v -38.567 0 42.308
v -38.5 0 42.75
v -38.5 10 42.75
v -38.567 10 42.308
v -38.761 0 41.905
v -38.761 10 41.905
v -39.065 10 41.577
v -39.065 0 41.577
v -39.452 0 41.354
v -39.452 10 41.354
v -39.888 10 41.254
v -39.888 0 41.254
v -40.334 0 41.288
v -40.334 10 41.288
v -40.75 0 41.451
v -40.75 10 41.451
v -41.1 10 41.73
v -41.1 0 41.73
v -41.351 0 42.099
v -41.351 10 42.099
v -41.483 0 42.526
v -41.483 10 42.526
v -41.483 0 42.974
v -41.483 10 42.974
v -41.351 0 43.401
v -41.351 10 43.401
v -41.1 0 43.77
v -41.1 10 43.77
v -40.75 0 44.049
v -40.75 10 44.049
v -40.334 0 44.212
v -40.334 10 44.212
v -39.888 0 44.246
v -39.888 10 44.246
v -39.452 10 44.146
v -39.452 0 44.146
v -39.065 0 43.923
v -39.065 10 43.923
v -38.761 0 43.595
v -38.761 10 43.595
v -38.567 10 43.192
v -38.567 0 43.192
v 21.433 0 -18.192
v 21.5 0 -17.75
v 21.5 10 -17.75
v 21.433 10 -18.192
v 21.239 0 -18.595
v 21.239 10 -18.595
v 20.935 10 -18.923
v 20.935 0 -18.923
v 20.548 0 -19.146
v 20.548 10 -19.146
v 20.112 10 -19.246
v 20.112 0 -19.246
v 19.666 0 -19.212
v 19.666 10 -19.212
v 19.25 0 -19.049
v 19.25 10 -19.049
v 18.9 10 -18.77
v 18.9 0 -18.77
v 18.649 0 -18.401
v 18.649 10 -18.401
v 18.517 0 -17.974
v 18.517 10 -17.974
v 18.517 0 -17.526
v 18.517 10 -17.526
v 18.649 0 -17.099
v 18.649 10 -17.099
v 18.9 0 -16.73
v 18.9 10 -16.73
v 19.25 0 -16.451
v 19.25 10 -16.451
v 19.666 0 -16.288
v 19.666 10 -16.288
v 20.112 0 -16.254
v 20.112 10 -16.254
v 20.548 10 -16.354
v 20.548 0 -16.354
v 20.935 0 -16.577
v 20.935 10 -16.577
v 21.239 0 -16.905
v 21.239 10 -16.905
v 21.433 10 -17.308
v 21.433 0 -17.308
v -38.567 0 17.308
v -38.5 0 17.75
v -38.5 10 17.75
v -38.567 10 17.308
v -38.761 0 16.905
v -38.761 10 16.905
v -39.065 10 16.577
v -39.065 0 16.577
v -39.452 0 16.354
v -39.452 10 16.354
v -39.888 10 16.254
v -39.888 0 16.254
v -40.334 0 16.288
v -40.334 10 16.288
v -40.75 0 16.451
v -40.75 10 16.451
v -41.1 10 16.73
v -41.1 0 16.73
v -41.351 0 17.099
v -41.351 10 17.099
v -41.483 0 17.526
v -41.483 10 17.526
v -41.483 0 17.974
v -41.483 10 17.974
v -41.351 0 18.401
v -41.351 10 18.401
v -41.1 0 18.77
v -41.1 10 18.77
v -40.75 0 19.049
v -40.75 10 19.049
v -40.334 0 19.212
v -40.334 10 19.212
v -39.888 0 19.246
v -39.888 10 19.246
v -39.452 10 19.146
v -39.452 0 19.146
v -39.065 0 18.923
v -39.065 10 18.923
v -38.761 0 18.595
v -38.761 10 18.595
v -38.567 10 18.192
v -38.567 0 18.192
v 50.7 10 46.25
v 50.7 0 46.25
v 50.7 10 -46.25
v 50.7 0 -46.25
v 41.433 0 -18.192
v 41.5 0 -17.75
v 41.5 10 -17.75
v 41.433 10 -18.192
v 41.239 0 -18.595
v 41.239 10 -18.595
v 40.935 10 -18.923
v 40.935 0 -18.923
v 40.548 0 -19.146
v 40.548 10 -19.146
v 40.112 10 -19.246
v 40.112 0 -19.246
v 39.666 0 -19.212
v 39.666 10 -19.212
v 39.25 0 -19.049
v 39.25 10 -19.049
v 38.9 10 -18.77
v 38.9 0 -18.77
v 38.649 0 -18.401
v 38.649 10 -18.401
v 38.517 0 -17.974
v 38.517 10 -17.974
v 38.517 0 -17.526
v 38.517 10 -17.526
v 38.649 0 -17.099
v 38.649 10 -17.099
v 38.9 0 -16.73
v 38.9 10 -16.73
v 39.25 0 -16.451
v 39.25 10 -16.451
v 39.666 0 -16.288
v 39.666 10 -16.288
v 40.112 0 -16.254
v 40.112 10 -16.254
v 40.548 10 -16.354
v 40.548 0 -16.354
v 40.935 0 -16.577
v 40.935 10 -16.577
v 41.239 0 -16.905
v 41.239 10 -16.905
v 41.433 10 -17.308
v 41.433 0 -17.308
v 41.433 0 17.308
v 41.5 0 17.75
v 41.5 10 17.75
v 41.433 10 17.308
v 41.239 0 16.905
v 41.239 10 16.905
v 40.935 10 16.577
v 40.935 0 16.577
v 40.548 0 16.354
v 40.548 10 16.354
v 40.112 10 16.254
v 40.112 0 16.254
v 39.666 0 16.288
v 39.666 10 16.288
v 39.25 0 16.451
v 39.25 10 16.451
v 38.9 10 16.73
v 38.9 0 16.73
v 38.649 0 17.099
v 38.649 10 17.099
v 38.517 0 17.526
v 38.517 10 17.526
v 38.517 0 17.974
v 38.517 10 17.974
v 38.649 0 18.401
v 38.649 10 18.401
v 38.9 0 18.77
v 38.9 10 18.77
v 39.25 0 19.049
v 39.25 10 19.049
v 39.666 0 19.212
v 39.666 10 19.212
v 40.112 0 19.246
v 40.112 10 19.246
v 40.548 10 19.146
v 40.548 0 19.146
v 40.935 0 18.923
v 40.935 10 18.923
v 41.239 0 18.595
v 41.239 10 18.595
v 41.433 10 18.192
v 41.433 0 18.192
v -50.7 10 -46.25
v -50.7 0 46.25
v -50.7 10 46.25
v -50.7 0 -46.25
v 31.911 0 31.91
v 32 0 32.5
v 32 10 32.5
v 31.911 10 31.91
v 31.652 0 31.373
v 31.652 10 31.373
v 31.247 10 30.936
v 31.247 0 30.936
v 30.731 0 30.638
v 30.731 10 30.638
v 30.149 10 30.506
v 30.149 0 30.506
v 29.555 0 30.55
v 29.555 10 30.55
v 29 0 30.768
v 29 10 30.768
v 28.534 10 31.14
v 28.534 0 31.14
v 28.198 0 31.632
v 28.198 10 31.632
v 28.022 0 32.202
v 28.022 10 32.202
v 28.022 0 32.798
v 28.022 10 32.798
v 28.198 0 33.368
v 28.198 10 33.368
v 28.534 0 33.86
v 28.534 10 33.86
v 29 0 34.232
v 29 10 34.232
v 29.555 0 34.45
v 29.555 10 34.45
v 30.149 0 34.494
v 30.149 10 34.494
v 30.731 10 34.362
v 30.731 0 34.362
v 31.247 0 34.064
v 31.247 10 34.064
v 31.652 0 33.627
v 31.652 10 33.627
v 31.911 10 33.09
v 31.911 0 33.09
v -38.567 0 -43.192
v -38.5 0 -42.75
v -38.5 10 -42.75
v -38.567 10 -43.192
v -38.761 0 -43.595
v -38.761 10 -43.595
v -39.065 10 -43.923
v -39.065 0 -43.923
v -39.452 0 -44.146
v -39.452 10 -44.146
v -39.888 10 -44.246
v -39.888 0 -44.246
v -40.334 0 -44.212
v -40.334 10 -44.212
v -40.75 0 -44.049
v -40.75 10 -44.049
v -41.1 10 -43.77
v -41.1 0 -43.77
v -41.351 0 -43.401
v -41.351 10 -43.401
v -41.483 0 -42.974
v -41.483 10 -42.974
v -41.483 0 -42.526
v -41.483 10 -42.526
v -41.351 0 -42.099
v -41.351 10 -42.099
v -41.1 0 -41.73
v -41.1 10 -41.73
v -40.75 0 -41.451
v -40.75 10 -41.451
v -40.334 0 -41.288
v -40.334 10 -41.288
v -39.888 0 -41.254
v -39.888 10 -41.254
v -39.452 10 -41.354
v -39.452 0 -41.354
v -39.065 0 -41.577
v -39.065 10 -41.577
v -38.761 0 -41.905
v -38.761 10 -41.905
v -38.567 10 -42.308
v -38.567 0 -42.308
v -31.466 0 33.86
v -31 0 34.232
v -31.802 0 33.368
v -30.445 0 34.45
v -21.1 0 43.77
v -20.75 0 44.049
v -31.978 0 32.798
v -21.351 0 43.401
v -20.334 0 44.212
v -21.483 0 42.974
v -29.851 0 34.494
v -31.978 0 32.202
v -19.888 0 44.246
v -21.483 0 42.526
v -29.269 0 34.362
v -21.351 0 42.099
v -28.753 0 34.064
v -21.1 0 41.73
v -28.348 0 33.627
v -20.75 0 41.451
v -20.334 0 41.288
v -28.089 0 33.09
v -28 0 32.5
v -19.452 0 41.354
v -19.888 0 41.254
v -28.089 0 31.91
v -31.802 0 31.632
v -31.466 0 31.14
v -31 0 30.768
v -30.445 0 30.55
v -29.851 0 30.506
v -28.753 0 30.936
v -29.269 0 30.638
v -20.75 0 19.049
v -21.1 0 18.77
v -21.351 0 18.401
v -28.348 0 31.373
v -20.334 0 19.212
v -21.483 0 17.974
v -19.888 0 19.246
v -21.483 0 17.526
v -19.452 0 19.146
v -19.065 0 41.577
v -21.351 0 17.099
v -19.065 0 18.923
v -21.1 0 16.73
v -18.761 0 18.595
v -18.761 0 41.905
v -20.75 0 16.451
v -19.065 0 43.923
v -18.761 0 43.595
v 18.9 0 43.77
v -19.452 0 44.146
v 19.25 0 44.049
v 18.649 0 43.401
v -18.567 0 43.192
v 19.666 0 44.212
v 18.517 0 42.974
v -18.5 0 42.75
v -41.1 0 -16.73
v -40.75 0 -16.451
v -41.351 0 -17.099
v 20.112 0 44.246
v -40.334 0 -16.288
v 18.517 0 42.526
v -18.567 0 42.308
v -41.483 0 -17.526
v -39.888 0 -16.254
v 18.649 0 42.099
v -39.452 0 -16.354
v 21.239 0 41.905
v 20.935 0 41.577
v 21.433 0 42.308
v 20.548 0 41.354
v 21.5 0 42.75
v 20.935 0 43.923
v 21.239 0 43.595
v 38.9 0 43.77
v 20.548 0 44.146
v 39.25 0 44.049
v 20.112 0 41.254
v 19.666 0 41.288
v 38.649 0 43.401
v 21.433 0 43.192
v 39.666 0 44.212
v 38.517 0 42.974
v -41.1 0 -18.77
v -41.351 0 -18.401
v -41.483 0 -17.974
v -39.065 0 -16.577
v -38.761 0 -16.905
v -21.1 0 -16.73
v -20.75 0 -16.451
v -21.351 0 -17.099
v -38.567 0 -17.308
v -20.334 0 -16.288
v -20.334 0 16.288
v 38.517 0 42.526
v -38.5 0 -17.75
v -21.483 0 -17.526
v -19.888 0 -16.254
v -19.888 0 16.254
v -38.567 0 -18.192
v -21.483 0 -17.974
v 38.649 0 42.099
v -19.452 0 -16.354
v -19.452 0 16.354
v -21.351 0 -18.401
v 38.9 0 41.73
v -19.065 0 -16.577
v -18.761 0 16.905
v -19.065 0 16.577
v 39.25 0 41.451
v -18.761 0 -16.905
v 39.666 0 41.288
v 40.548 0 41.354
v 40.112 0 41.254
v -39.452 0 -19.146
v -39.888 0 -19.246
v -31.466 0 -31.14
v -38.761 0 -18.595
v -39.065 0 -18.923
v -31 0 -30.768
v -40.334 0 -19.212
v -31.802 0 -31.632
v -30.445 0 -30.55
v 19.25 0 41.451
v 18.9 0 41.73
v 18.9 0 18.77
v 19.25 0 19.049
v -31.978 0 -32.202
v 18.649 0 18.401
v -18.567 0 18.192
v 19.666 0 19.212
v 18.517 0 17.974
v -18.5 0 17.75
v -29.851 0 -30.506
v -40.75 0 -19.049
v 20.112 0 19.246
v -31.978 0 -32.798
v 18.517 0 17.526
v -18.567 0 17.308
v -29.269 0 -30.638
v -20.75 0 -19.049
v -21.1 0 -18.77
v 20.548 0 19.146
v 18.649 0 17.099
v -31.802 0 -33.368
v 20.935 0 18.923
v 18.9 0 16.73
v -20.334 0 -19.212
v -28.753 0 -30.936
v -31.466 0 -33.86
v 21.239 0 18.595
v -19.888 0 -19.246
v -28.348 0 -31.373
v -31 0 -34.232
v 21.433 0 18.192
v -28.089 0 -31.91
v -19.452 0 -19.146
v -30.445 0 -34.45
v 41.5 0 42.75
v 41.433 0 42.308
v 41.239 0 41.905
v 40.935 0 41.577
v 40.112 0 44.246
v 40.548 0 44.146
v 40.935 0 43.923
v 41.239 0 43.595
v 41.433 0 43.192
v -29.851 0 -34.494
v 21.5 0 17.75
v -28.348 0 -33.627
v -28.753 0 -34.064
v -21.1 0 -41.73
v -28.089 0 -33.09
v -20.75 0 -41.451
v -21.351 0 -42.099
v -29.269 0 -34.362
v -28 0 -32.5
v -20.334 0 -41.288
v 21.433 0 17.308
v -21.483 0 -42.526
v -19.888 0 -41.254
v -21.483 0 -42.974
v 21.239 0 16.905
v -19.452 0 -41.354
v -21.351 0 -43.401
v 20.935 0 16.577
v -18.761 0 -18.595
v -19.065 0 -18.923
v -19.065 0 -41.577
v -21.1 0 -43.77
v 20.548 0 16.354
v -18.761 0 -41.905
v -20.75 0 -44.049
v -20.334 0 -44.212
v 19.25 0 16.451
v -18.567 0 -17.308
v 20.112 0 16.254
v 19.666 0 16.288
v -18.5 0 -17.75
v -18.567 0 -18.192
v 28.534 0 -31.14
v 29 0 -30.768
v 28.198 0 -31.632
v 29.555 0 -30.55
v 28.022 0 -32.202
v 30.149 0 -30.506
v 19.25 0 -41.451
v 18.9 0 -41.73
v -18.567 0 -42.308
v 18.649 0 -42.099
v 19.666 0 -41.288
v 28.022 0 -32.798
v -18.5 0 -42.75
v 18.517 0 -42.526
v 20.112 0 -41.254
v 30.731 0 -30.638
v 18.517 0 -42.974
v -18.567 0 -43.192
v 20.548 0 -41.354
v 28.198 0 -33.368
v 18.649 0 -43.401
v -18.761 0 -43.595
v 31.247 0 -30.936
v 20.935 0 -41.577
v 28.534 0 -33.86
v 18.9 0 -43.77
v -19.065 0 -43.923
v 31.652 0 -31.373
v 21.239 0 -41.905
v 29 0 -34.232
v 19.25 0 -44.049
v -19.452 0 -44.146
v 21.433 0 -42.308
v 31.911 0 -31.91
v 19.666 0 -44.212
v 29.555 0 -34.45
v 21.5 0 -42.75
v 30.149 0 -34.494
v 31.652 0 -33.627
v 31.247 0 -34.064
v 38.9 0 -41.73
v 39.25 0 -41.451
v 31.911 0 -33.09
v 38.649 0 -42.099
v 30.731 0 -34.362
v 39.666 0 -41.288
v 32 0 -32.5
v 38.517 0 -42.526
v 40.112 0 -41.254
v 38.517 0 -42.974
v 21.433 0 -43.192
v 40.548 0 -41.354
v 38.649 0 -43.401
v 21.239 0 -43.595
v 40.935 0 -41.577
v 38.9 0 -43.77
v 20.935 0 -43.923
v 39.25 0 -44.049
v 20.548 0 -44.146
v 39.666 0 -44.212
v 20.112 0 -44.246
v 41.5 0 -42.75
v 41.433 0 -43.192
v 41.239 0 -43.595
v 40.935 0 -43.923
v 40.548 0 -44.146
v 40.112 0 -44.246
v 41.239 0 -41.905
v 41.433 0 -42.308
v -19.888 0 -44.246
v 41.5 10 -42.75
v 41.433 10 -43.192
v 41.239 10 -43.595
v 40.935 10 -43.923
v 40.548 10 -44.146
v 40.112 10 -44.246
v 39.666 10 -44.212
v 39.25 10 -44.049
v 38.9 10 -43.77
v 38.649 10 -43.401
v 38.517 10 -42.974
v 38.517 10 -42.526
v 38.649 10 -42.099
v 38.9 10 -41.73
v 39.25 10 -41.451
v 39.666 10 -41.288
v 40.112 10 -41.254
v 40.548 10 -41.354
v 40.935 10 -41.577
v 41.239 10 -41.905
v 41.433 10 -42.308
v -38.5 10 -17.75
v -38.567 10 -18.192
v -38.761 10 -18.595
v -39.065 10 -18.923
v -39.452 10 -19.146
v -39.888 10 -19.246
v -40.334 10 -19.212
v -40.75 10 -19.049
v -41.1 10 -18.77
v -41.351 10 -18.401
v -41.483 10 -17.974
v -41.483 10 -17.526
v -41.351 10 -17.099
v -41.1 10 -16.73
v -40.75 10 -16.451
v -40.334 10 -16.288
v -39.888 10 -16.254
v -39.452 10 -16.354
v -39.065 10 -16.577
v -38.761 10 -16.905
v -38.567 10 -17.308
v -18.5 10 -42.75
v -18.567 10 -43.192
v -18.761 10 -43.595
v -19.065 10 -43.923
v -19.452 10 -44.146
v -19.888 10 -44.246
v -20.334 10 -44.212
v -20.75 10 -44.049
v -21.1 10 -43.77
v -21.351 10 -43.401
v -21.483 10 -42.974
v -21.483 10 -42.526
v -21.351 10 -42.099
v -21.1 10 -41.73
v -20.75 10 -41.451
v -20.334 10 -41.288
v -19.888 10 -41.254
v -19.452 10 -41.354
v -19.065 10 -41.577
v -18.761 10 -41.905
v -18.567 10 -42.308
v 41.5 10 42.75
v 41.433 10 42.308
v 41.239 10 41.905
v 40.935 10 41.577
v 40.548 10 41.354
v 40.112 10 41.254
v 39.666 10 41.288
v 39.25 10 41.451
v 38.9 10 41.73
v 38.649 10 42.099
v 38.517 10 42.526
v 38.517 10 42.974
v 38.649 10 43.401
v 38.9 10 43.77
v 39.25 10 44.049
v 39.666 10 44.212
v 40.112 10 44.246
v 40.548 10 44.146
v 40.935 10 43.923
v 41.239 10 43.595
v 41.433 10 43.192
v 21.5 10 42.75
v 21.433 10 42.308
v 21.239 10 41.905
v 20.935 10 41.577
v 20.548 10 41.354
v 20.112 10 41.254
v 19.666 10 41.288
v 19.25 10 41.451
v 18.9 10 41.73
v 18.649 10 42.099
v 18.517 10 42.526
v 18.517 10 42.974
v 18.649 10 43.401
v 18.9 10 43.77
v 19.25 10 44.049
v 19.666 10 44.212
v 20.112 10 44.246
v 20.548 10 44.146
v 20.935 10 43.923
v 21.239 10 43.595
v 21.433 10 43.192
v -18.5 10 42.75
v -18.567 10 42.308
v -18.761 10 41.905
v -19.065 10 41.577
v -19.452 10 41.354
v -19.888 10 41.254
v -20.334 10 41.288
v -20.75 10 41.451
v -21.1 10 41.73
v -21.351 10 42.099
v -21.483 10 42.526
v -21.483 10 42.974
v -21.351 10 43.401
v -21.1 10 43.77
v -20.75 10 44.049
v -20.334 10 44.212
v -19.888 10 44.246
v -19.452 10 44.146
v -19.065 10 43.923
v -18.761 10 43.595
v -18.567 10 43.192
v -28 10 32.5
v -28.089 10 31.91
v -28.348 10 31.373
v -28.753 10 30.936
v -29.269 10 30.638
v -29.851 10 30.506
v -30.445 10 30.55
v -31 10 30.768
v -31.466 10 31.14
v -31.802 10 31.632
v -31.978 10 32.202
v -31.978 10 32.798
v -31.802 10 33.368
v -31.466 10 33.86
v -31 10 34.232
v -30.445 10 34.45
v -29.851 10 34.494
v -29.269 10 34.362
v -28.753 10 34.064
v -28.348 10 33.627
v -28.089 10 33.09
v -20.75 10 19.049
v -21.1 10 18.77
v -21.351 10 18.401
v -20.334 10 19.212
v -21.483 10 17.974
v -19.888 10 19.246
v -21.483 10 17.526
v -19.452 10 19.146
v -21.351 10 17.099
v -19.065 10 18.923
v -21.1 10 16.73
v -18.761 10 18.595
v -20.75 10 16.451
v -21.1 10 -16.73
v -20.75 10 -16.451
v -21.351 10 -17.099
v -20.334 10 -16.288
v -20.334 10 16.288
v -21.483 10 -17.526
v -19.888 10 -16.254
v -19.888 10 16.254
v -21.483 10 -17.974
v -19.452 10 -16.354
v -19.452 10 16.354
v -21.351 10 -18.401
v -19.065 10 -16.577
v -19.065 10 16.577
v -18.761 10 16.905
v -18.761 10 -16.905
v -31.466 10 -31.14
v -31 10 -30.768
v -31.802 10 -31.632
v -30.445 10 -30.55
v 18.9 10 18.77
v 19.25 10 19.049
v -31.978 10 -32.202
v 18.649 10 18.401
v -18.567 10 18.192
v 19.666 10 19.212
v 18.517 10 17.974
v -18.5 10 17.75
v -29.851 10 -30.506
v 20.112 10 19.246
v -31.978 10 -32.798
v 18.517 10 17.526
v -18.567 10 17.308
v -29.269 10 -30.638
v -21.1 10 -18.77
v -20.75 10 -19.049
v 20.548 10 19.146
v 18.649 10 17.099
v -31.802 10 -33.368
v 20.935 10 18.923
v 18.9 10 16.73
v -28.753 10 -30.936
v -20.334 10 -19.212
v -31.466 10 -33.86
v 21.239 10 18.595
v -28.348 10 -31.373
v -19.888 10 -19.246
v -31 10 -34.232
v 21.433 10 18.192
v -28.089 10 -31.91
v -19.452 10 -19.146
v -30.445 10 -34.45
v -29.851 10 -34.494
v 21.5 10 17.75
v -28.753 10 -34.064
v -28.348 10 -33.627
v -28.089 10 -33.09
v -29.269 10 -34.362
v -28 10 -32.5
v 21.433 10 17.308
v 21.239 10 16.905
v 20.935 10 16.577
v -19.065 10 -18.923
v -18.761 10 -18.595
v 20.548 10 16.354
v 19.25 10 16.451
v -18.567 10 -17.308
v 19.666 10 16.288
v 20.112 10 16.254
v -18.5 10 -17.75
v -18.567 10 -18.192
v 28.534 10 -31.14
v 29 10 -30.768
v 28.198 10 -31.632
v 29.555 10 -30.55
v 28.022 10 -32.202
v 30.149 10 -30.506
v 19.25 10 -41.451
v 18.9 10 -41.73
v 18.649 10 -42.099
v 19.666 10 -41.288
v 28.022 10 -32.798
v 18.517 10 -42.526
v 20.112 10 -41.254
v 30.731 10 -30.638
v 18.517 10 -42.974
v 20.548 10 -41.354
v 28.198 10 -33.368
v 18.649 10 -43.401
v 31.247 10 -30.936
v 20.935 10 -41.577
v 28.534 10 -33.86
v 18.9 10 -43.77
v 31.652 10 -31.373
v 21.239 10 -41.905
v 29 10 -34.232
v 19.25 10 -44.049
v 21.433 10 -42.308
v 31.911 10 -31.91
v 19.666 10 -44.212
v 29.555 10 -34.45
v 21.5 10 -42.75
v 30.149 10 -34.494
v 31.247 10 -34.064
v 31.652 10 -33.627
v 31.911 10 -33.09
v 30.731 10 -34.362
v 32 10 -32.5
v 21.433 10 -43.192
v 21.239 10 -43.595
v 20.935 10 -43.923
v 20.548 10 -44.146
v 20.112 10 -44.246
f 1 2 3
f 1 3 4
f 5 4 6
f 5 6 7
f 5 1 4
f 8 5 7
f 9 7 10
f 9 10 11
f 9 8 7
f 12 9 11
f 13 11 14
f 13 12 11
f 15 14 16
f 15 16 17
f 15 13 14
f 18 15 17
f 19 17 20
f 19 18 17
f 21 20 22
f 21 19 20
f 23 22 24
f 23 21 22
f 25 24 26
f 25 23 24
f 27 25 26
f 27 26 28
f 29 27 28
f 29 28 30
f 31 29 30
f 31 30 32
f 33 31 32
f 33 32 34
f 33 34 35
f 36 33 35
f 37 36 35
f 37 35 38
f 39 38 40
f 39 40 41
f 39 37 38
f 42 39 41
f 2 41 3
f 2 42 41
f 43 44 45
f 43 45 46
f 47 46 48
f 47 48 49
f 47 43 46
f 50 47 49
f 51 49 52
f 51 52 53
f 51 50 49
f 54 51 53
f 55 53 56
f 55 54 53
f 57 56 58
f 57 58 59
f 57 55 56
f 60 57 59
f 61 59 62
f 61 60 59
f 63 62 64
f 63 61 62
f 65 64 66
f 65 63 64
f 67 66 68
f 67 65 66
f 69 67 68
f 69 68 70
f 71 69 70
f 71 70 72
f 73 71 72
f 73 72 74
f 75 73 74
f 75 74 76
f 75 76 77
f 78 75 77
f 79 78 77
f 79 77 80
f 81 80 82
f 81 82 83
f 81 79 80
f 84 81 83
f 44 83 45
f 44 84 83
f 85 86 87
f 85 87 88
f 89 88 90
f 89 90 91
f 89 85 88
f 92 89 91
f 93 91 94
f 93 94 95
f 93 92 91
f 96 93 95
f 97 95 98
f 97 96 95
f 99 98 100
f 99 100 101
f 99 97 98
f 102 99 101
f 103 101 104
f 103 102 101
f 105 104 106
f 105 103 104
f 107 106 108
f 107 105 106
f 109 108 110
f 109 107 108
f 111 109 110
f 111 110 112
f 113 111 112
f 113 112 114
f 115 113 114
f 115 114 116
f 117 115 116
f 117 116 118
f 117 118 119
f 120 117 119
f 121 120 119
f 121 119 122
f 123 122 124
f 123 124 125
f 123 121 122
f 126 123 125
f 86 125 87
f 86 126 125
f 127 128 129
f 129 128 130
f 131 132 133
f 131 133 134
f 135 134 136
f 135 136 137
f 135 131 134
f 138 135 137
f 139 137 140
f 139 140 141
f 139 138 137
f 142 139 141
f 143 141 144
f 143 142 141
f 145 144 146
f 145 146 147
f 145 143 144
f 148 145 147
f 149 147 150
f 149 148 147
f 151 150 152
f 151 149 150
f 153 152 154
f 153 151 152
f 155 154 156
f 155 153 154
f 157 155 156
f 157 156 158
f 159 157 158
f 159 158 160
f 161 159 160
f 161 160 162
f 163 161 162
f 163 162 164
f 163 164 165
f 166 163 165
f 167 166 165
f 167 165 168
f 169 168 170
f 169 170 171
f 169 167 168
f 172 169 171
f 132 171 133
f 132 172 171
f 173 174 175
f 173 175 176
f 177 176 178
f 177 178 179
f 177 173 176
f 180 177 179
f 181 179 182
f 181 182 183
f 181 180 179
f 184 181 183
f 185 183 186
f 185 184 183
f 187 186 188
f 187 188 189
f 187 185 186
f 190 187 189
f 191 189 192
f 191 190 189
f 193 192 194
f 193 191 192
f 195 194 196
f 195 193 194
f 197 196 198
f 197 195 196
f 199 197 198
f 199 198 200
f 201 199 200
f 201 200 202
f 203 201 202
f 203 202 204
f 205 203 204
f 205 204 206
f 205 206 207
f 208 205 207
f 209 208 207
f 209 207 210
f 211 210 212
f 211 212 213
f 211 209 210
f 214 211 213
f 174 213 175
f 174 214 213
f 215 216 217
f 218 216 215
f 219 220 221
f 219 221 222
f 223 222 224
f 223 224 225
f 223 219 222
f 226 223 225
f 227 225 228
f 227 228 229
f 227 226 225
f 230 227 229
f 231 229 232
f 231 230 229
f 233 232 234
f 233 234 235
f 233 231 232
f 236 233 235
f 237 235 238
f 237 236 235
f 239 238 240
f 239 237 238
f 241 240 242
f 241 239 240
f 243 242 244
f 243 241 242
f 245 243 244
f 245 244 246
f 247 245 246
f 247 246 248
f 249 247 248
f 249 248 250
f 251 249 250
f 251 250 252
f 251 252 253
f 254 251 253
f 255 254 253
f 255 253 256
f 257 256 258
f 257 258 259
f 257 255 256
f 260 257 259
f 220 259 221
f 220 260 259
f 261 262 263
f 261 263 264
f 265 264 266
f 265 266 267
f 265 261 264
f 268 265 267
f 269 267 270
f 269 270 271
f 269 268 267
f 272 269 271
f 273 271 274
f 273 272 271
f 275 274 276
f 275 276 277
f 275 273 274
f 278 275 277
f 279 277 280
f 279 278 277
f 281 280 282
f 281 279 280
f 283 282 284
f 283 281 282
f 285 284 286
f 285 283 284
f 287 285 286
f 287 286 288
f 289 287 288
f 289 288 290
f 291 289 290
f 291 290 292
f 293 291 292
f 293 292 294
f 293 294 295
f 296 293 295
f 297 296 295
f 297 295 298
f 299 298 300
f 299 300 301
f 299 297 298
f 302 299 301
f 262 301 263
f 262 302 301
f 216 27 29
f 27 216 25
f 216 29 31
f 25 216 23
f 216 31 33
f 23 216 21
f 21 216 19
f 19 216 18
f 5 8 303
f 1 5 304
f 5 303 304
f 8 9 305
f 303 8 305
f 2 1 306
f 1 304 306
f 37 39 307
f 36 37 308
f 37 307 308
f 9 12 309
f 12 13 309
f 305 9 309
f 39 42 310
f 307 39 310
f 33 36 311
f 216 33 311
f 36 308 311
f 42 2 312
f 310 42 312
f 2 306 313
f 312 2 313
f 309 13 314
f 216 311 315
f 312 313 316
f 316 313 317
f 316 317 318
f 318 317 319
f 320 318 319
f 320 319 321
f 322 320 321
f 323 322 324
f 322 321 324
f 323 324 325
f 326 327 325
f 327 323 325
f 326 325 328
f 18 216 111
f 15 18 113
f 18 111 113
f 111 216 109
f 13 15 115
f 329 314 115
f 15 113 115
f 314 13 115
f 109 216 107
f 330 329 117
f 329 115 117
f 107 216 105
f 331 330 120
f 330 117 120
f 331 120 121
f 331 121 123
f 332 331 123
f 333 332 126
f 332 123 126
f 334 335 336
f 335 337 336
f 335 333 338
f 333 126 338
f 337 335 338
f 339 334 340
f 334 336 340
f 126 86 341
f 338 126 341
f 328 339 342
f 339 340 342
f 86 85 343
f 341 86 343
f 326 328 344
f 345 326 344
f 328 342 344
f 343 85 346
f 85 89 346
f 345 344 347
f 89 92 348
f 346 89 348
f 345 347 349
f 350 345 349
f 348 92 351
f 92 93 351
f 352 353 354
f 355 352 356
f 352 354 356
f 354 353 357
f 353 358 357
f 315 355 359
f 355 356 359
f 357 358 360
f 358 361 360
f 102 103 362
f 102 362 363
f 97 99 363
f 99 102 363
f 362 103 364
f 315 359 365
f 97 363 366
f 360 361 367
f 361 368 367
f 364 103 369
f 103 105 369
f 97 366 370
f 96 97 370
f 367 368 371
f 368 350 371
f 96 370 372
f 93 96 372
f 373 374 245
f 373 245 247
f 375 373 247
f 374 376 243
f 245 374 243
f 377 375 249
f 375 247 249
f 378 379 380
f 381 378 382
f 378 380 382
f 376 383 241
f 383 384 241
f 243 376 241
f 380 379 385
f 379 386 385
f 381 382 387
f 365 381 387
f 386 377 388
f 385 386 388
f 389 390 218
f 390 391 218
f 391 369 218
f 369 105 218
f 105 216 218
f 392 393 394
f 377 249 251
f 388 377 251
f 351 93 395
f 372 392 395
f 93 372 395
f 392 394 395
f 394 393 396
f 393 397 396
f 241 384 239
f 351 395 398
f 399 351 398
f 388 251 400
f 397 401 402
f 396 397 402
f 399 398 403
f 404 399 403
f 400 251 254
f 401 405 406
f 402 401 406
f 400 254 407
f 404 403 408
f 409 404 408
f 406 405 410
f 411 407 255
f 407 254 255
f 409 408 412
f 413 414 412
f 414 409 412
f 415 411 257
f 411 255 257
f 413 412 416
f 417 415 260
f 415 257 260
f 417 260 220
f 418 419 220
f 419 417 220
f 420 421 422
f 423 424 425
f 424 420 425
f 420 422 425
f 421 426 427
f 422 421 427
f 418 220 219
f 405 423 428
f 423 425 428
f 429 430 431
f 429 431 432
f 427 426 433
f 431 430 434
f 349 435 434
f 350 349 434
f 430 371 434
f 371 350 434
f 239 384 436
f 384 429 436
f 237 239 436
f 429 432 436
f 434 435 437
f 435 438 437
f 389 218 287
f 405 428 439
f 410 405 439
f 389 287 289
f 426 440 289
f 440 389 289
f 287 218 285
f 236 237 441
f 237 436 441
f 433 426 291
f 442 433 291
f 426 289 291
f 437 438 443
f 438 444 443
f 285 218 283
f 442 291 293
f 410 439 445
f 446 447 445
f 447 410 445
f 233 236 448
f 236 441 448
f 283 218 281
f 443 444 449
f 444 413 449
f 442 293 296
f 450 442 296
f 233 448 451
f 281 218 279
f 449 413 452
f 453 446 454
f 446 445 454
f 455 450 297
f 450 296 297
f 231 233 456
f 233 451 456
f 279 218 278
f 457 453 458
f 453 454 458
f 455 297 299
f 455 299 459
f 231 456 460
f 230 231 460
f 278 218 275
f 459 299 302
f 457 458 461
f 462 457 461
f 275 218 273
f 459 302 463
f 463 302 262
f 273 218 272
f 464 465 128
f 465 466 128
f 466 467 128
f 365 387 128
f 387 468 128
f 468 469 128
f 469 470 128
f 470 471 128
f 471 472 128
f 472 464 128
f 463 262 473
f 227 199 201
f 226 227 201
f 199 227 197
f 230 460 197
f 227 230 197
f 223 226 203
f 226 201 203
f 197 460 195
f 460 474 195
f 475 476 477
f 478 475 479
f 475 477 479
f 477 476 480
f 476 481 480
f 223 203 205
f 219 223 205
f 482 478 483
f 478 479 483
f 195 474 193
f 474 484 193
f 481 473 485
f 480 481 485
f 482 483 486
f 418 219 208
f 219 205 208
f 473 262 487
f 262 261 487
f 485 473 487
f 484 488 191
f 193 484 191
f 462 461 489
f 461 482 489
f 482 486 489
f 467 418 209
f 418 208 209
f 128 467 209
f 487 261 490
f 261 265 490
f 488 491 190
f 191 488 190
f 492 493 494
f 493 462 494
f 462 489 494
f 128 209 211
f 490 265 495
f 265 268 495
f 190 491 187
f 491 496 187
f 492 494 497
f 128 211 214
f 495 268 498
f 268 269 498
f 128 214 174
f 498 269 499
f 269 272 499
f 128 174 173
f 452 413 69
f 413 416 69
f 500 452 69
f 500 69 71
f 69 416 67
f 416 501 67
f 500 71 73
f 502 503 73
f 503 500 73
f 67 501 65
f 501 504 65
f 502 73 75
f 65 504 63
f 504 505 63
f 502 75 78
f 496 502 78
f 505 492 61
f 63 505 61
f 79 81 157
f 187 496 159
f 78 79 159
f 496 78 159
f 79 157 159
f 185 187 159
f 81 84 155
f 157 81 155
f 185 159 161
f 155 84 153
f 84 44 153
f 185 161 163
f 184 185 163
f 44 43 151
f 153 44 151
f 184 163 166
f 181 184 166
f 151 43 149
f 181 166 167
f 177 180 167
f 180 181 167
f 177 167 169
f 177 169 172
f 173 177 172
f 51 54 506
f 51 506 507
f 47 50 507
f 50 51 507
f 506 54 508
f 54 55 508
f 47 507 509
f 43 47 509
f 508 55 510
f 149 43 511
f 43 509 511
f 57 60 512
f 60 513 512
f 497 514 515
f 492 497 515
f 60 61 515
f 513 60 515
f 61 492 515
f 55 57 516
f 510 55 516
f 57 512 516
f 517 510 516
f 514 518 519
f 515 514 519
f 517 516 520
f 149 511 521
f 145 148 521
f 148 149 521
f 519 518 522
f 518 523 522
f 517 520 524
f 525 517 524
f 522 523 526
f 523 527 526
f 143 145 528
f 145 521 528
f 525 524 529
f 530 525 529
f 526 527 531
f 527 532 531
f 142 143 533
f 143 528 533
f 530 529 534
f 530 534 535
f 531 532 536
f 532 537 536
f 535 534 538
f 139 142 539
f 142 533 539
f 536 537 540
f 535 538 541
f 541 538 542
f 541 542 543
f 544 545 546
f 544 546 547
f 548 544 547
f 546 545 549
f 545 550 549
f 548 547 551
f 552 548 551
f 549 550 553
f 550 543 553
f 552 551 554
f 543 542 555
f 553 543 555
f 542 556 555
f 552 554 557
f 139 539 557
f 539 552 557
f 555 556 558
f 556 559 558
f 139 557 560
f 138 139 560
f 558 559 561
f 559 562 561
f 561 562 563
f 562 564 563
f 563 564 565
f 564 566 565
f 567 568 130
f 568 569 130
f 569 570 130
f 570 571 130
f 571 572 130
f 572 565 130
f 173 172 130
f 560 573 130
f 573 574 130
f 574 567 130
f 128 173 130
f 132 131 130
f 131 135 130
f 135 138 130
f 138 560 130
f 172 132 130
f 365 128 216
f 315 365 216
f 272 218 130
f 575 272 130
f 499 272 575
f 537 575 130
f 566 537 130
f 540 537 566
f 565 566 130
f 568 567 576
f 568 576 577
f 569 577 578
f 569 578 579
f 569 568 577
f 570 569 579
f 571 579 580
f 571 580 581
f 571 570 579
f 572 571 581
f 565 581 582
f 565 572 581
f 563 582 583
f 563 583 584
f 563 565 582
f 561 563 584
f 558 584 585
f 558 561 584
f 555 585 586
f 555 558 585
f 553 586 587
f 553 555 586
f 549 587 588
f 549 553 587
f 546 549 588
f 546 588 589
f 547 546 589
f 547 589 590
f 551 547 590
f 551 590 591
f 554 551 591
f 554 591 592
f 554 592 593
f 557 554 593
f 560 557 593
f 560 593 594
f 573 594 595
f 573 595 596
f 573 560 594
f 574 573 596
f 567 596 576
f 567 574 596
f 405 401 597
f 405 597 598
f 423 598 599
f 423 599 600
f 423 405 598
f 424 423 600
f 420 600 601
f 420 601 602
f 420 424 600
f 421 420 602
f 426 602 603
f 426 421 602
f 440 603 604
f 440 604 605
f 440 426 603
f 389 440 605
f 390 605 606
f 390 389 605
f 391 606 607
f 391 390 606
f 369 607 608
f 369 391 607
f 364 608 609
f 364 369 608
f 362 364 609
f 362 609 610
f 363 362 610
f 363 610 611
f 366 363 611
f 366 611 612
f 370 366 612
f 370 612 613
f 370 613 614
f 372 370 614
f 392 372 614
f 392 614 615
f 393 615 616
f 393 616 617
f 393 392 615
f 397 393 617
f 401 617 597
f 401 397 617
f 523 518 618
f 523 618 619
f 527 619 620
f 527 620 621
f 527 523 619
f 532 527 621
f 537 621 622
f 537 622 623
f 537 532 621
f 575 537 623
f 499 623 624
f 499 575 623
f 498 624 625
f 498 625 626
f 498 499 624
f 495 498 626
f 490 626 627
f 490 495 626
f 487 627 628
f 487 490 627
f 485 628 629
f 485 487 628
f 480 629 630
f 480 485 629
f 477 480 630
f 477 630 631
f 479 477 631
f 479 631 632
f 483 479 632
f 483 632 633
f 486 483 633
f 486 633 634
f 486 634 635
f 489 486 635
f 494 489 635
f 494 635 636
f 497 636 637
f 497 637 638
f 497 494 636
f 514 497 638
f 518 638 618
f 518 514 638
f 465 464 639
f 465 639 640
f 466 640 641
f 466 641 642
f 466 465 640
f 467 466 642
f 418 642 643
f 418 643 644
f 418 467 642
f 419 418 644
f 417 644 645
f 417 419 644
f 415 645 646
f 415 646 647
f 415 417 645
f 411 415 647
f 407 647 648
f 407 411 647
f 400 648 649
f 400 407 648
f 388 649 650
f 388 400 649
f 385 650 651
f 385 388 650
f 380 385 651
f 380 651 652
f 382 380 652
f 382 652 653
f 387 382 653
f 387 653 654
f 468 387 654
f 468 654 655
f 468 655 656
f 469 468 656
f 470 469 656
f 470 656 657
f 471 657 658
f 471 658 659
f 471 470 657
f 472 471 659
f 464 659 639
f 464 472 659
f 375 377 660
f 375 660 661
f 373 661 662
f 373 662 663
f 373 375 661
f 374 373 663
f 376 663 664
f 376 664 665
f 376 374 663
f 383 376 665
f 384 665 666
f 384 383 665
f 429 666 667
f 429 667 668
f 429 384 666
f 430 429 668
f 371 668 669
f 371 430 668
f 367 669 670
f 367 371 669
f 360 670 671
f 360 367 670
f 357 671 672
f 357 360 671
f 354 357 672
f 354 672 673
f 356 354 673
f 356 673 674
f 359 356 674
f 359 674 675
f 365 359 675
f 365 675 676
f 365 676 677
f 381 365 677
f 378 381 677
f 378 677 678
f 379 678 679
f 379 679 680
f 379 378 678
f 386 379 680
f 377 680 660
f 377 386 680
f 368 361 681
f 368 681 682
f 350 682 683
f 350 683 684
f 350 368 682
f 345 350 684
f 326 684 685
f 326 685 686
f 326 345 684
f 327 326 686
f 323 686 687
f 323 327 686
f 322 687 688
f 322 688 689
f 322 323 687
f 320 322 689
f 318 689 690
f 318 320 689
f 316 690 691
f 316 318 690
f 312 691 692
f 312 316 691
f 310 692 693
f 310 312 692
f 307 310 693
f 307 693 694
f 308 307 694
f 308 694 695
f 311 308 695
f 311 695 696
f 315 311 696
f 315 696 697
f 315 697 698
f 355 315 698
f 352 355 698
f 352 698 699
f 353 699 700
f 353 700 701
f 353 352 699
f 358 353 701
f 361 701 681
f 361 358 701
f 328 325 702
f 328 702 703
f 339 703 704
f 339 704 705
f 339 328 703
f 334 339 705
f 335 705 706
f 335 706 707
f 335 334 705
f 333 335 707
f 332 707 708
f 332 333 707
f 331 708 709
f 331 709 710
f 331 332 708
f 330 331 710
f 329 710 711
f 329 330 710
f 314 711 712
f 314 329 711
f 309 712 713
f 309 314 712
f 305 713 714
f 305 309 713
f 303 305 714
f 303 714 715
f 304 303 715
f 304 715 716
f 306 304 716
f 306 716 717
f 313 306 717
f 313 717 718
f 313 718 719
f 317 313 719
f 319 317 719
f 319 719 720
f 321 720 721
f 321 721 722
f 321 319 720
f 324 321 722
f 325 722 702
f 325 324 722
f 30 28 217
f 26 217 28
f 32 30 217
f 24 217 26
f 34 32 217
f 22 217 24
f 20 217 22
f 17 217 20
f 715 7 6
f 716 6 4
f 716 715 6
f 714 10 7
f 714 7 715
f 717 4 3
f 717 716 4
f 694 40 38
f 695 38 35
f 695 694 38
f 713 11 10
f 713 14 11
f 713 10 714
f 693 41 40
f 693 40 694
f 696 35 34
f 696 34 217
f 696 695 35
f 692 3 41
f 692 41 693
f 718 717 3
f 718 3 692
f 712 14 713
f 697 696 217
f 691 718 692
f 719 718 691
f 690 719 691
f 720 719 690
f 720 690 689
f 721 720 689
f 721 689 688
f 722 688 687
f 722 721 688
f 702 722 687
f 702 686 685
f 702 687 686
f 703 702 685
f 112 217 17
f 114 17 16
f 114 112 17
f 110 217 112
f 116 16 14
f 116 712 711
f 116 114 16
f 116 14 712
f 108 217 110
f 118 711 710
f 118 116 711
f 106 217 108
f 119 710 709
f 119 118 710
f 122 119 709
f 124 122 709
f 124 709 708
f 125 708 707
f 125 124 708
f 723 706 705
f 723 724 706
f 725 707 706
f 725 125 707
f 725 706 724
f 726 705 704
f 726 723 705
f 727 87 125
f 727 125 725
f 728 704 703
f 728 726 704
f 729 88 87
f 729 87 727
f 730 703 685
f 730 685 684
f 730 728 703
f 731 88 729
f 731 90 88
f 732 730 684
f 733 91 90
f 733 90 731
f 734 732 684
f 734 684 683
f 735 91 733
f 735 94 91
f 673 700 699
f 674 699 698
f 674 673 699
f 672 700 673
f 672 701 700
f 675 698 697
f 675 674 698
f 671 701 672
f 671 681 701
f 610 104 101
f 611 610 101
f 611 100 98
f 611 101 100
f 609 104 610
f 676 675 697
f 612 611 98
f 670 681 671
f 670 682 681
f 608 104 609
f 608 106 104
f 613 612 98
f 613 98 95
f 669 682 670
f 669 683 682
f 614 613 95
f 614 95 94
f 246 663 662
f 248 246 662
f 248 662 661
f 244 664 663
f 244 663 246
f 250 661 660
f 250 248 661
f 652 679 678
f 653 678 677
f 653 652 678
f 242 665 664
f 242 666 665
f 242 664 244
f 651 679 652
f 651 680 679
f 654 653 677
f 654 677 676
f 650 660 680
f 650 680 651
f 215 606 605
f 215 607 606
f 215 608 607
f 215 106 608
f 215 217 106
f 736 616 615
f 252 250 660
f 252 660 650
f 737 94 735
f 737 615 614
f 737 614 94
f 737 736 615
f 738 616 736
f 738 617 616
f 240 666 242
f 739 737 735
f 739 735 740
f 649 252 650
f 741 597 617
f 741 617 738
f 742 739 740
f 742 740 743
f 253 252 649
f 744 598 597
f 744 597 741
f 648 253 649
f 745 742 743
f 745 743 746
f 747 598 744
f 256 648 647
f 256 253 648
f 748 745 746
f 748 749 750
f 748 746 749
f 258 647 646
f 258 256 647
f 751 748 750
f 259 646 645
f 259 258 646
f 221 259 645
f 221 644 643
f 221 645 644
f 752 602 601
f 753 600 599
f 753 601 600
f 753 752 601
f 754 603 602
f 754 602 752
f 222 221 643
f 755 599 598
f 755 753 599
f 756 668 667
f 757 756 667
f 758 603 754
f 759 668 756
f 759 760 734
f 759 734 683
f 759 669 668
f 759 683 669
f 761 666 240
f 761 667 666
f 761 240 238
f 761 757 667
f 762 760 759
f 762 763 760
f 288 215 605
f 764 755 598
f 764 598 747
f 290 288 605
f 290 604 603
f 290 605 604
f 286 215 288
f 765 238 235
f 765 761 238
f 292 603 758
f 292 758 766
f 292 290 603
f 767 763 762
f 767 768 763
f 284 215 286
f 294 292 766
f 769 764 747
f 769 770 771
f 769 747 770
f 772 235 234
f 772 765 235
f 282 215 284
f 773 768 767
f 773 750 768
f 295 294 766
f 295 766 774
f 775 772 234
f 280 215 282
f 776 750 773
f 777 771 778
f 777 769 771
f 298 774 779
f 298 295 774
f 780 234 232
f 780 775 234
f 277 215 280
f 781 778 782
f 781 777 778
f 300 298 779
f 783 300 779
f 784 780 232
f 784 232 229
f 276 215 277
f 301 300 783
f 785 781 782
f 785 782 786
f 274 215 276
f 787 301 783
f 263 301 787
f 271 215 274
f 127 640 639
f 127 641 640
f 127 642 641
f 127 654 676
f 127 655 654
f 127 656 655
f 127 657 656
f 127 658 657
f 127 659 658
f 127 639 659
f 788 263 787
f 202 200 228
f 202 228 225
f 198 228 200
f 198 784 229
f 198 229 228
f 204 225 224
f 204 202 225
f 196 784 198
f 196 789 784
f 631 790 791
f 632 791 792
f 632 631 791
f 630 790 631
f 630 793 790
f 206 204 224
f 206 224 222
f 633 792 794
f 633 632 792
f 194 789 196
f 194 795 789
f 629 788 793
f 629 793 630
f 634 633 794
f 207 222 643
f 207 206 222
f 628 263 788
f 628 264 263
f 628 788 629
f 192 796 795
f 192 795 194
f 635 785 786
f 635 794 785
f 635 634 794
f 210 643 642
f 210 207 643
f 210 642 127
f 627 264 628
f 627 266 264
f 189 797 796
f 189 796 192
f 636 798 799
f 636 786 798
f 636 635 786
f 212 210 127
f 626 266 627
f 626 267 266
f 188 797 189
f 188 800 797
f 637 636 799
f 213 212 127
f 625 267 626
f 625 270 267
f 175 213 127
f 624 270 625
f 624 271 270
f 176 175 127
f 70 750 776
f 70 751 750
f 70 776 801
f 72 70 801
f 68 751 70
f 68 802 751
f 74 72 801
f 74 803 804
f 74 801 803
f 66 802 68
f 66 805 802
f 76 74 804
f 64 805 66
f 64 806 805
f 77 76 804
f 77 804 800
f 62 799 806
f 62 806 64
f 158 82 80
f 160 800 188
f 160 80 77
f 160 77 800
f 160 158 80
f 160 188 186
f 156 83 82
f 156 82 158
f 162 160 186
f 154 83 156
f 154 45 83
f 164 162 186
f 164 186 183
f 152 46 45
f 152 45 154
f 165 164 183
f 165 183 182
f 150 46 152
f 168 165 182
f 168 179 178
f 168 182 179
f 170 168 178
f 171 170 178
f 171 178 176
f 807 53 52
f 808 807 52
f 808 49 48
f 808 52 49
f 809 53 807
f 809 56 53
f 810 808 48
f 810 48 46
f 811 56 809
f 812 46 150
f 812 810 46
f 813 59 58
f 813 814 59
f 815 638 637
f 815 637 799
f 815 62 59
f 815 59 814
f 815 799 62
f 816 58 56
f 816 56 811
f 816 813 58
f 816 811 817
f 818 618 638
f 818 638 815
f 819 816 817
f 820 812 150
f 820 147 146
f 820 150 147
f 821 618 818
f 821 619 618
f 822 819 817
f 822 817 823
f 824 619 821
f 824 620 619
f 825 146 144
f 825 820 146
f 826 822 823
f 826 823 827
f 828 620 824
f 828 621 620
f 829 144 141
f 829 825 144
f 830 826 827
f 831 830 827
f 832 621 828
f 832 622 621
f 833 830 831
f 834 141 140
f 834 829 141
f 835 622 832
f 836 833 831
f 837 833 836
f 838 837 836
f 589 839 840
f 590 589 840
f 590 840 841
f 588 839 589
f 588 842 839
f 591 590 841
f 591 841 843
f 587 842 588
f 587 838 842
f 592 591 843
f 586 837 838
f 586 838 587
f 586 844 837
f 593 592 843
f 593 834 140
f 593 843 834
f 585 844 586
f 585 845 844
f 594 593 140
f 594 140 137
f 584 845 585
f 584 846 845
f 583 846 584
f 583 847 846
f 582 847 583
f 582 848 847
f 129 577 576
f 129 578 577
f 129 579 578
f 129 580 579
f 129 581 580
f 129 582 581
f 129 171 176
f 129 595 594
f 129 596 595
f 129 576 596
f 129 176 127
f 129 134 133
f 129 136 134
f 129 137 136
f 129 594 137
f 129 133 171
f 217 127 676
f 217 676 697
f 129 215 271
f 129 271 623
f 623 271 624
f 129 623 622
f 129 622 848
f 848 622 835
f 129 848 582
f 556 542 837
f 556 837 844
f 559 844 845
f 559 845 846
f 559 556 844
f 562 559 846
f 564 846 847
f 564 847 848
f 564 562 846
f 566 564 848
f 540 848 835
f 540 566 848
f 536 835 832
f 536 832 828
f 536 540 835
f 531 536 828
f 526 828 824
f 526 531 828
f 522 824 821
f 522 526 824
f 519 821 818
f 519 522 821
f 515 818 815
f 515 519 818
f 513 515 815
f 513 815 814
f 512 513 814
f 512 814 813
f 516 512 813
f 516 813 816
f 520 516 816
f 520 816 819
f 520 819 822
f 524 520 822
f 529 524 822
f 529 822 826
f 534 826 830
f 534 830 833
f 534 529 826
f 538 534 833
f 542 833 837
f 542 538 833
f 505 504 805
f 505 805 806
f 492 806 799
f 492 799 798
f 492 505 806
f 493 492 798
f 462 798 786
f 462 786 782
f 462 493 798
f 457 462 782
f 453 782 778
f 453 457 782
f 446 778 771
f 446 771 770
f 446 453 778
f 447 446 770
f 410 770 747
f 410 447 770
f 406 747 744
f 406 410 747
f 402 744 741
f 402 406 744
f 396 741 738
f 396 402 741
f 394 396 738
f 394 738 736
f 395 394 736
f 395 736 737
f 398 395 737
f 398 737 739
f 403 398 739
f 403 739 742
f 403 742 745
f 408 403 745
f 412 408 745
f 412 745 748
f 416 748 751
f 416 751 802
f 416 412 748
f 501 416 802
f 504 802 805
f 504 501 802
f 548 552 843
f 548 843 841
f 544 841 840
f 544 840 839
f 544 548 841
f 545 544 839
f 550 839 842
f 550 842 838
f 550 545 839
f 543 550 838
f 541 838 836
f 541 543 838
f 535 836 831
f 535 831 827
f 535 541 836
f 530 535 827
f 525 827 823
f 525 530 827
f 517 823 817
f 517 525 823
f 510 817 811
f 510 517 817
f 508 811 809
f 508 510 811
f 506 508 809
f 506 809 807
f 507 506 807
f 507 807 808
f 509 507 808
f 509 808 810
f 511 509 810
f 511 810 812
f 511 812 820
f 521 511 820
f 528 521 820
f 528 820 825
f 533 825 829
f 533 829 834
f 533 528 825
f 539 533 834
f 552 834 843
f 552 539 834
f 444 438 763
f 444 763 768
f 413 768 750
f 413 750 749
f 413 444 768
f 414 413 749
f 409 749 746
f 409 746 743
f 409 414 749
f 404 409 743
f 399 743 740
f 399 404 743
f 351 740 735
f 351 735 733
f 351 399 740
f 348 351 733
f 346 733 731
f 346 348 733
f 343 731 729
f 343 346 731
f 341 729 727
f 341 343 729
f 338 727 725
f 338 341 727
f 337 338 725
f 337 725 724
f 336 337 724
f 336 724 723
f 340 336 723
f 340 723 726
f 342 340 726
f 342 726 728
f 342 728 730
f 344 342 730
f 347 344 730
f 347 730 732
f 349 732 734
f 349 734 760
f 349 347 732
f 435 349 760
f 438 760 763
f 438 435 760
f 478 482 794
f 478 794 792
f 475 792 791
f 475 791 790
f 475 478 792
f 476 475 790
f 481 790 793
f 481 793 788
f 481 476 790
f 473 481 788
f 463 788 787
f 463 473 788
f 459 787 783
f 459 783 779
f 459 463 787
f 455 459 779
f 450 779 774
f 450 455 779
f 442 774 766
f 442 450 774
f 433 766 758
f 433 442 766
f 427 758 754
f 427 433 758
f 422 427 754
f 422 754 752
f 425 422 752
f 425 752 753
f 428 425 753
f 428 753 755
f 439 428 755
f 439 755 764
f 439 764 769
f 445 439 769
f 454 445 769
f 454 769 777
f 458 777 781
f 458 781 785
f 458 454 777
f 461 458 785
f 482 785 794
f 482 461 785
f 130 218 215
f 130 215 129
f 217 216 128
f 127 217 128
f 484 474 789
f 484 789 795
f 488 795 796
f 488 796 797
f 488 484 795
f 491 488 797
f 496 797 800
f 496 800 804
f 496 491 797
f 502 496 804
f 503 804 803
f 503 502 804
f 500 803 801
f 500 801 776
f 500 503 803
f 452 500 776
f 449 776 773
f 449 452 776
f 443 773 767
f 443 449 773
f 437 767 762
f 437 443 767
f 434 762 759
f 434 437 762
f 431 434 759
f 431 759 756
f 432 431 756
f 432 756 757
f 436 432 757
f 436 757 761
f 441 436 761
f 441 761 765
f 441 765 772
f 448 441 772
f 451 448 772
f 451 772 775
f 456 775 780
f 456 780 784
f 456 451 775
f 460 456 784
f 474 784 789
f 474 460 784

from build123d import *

# Parameters (mm, degrees)
SKETCH1_W           = 101.4
SKETCH1_H           = 92.5
SKETCH1_R           = 1.5
SKETCH1_R_2         = 2
BOSS_EXTRUDE1_DEPTH = 10


with BuildPart() as part:
    # Sketch1 → Boss-Extrude1 (new body)
    with BuildSketch(Plane(origin=(0, 0, 0), x_dir=(1, 0, 0), z_dir=(0, 1, 0))):
        Rectangle(SKETCH1_W, SKETCH1_H)
        with Locations((-40, 42.75)):
            Circle(SKETCH1_R, mode=Mode.SUBTRACT)
        with Locations((-20, 42.75)):
            Circle(SKETCH1_R, mode=Mode.SUBTRACT)
        with Locations((-20, 17.75)):
            Circle(SKETCH1_R, mode=Mode.SUBTRACT)
        with Locations((-40, 17.75)):
            Circle(SKETCH1_R, mode=Mode.SUBTRACT)
        with Locations((-40, -42.75)):
            Circle(SKETCH1_R, mode=Mode.SUBTRACT)
        with Locations((-20, -42.75)):
            Circle(SKETCH1_R, mode=Mode.SUBTRACT)
        with Locations((-20, -17.75)):
            Circle(SKETCH1_R, mode=Mode.SUBTRACT)
        with Locations((-40, -17.75)):
            Circle(SKETCH1_R, mode=Mode.SUBTRACT)
        with Locations((40, -17.75)):
            Circle(SKETCH1_R, mode=Mode.SUBTRACT)
        with Locations((20, -17.75)):
            Circle(SKETCH1_R, mode=Mode.SUBTRACT)
        with Locations((20, -42.75)):
            Circle(SKETCH1_R, mode=Mode.SUBTRACT)
        with Locations((40, -42.75)):
            Circle(SKETCH1_R, mode=Mode.SUBTRACT)
        with Locations((40, 17.75)):
            Circle(SKETCH1_R, mode=Mode.SUBTRACT)
        with Locations((20, 17.75)):
            Circle(SKETCH1_R, mode=Mode.SUBTRACT)
        with Locations((20, 42.75)):
            Circle(SKETCH1_R, mode=Mode.SUBTRACT)
        with Locations((40, 42.75)):
            Circle(SKETCH1_R, mode=Mode.SUBTRACT)
        with Locations((-30, 32.5)):
            Circle(SKETCH1_R_2, mode=Mode.SUBTRACT)
        with Locations((30, 32.5)):
            Circle(SKETCH1_R_2, mode=Mode.SUBTRACT)
        with Locations((30, -32.5)):
            Circle(SKETCH1_R_2, mode=Mode.SUBTRACT)
        with Locations((-30, -32.5)):
            Circle(SKETCH1_R_2, mode=Mode.SUBTRACT)
    extrude(amount=BOSS_EXTRUDE1_DEPTH)


solid = part.part
